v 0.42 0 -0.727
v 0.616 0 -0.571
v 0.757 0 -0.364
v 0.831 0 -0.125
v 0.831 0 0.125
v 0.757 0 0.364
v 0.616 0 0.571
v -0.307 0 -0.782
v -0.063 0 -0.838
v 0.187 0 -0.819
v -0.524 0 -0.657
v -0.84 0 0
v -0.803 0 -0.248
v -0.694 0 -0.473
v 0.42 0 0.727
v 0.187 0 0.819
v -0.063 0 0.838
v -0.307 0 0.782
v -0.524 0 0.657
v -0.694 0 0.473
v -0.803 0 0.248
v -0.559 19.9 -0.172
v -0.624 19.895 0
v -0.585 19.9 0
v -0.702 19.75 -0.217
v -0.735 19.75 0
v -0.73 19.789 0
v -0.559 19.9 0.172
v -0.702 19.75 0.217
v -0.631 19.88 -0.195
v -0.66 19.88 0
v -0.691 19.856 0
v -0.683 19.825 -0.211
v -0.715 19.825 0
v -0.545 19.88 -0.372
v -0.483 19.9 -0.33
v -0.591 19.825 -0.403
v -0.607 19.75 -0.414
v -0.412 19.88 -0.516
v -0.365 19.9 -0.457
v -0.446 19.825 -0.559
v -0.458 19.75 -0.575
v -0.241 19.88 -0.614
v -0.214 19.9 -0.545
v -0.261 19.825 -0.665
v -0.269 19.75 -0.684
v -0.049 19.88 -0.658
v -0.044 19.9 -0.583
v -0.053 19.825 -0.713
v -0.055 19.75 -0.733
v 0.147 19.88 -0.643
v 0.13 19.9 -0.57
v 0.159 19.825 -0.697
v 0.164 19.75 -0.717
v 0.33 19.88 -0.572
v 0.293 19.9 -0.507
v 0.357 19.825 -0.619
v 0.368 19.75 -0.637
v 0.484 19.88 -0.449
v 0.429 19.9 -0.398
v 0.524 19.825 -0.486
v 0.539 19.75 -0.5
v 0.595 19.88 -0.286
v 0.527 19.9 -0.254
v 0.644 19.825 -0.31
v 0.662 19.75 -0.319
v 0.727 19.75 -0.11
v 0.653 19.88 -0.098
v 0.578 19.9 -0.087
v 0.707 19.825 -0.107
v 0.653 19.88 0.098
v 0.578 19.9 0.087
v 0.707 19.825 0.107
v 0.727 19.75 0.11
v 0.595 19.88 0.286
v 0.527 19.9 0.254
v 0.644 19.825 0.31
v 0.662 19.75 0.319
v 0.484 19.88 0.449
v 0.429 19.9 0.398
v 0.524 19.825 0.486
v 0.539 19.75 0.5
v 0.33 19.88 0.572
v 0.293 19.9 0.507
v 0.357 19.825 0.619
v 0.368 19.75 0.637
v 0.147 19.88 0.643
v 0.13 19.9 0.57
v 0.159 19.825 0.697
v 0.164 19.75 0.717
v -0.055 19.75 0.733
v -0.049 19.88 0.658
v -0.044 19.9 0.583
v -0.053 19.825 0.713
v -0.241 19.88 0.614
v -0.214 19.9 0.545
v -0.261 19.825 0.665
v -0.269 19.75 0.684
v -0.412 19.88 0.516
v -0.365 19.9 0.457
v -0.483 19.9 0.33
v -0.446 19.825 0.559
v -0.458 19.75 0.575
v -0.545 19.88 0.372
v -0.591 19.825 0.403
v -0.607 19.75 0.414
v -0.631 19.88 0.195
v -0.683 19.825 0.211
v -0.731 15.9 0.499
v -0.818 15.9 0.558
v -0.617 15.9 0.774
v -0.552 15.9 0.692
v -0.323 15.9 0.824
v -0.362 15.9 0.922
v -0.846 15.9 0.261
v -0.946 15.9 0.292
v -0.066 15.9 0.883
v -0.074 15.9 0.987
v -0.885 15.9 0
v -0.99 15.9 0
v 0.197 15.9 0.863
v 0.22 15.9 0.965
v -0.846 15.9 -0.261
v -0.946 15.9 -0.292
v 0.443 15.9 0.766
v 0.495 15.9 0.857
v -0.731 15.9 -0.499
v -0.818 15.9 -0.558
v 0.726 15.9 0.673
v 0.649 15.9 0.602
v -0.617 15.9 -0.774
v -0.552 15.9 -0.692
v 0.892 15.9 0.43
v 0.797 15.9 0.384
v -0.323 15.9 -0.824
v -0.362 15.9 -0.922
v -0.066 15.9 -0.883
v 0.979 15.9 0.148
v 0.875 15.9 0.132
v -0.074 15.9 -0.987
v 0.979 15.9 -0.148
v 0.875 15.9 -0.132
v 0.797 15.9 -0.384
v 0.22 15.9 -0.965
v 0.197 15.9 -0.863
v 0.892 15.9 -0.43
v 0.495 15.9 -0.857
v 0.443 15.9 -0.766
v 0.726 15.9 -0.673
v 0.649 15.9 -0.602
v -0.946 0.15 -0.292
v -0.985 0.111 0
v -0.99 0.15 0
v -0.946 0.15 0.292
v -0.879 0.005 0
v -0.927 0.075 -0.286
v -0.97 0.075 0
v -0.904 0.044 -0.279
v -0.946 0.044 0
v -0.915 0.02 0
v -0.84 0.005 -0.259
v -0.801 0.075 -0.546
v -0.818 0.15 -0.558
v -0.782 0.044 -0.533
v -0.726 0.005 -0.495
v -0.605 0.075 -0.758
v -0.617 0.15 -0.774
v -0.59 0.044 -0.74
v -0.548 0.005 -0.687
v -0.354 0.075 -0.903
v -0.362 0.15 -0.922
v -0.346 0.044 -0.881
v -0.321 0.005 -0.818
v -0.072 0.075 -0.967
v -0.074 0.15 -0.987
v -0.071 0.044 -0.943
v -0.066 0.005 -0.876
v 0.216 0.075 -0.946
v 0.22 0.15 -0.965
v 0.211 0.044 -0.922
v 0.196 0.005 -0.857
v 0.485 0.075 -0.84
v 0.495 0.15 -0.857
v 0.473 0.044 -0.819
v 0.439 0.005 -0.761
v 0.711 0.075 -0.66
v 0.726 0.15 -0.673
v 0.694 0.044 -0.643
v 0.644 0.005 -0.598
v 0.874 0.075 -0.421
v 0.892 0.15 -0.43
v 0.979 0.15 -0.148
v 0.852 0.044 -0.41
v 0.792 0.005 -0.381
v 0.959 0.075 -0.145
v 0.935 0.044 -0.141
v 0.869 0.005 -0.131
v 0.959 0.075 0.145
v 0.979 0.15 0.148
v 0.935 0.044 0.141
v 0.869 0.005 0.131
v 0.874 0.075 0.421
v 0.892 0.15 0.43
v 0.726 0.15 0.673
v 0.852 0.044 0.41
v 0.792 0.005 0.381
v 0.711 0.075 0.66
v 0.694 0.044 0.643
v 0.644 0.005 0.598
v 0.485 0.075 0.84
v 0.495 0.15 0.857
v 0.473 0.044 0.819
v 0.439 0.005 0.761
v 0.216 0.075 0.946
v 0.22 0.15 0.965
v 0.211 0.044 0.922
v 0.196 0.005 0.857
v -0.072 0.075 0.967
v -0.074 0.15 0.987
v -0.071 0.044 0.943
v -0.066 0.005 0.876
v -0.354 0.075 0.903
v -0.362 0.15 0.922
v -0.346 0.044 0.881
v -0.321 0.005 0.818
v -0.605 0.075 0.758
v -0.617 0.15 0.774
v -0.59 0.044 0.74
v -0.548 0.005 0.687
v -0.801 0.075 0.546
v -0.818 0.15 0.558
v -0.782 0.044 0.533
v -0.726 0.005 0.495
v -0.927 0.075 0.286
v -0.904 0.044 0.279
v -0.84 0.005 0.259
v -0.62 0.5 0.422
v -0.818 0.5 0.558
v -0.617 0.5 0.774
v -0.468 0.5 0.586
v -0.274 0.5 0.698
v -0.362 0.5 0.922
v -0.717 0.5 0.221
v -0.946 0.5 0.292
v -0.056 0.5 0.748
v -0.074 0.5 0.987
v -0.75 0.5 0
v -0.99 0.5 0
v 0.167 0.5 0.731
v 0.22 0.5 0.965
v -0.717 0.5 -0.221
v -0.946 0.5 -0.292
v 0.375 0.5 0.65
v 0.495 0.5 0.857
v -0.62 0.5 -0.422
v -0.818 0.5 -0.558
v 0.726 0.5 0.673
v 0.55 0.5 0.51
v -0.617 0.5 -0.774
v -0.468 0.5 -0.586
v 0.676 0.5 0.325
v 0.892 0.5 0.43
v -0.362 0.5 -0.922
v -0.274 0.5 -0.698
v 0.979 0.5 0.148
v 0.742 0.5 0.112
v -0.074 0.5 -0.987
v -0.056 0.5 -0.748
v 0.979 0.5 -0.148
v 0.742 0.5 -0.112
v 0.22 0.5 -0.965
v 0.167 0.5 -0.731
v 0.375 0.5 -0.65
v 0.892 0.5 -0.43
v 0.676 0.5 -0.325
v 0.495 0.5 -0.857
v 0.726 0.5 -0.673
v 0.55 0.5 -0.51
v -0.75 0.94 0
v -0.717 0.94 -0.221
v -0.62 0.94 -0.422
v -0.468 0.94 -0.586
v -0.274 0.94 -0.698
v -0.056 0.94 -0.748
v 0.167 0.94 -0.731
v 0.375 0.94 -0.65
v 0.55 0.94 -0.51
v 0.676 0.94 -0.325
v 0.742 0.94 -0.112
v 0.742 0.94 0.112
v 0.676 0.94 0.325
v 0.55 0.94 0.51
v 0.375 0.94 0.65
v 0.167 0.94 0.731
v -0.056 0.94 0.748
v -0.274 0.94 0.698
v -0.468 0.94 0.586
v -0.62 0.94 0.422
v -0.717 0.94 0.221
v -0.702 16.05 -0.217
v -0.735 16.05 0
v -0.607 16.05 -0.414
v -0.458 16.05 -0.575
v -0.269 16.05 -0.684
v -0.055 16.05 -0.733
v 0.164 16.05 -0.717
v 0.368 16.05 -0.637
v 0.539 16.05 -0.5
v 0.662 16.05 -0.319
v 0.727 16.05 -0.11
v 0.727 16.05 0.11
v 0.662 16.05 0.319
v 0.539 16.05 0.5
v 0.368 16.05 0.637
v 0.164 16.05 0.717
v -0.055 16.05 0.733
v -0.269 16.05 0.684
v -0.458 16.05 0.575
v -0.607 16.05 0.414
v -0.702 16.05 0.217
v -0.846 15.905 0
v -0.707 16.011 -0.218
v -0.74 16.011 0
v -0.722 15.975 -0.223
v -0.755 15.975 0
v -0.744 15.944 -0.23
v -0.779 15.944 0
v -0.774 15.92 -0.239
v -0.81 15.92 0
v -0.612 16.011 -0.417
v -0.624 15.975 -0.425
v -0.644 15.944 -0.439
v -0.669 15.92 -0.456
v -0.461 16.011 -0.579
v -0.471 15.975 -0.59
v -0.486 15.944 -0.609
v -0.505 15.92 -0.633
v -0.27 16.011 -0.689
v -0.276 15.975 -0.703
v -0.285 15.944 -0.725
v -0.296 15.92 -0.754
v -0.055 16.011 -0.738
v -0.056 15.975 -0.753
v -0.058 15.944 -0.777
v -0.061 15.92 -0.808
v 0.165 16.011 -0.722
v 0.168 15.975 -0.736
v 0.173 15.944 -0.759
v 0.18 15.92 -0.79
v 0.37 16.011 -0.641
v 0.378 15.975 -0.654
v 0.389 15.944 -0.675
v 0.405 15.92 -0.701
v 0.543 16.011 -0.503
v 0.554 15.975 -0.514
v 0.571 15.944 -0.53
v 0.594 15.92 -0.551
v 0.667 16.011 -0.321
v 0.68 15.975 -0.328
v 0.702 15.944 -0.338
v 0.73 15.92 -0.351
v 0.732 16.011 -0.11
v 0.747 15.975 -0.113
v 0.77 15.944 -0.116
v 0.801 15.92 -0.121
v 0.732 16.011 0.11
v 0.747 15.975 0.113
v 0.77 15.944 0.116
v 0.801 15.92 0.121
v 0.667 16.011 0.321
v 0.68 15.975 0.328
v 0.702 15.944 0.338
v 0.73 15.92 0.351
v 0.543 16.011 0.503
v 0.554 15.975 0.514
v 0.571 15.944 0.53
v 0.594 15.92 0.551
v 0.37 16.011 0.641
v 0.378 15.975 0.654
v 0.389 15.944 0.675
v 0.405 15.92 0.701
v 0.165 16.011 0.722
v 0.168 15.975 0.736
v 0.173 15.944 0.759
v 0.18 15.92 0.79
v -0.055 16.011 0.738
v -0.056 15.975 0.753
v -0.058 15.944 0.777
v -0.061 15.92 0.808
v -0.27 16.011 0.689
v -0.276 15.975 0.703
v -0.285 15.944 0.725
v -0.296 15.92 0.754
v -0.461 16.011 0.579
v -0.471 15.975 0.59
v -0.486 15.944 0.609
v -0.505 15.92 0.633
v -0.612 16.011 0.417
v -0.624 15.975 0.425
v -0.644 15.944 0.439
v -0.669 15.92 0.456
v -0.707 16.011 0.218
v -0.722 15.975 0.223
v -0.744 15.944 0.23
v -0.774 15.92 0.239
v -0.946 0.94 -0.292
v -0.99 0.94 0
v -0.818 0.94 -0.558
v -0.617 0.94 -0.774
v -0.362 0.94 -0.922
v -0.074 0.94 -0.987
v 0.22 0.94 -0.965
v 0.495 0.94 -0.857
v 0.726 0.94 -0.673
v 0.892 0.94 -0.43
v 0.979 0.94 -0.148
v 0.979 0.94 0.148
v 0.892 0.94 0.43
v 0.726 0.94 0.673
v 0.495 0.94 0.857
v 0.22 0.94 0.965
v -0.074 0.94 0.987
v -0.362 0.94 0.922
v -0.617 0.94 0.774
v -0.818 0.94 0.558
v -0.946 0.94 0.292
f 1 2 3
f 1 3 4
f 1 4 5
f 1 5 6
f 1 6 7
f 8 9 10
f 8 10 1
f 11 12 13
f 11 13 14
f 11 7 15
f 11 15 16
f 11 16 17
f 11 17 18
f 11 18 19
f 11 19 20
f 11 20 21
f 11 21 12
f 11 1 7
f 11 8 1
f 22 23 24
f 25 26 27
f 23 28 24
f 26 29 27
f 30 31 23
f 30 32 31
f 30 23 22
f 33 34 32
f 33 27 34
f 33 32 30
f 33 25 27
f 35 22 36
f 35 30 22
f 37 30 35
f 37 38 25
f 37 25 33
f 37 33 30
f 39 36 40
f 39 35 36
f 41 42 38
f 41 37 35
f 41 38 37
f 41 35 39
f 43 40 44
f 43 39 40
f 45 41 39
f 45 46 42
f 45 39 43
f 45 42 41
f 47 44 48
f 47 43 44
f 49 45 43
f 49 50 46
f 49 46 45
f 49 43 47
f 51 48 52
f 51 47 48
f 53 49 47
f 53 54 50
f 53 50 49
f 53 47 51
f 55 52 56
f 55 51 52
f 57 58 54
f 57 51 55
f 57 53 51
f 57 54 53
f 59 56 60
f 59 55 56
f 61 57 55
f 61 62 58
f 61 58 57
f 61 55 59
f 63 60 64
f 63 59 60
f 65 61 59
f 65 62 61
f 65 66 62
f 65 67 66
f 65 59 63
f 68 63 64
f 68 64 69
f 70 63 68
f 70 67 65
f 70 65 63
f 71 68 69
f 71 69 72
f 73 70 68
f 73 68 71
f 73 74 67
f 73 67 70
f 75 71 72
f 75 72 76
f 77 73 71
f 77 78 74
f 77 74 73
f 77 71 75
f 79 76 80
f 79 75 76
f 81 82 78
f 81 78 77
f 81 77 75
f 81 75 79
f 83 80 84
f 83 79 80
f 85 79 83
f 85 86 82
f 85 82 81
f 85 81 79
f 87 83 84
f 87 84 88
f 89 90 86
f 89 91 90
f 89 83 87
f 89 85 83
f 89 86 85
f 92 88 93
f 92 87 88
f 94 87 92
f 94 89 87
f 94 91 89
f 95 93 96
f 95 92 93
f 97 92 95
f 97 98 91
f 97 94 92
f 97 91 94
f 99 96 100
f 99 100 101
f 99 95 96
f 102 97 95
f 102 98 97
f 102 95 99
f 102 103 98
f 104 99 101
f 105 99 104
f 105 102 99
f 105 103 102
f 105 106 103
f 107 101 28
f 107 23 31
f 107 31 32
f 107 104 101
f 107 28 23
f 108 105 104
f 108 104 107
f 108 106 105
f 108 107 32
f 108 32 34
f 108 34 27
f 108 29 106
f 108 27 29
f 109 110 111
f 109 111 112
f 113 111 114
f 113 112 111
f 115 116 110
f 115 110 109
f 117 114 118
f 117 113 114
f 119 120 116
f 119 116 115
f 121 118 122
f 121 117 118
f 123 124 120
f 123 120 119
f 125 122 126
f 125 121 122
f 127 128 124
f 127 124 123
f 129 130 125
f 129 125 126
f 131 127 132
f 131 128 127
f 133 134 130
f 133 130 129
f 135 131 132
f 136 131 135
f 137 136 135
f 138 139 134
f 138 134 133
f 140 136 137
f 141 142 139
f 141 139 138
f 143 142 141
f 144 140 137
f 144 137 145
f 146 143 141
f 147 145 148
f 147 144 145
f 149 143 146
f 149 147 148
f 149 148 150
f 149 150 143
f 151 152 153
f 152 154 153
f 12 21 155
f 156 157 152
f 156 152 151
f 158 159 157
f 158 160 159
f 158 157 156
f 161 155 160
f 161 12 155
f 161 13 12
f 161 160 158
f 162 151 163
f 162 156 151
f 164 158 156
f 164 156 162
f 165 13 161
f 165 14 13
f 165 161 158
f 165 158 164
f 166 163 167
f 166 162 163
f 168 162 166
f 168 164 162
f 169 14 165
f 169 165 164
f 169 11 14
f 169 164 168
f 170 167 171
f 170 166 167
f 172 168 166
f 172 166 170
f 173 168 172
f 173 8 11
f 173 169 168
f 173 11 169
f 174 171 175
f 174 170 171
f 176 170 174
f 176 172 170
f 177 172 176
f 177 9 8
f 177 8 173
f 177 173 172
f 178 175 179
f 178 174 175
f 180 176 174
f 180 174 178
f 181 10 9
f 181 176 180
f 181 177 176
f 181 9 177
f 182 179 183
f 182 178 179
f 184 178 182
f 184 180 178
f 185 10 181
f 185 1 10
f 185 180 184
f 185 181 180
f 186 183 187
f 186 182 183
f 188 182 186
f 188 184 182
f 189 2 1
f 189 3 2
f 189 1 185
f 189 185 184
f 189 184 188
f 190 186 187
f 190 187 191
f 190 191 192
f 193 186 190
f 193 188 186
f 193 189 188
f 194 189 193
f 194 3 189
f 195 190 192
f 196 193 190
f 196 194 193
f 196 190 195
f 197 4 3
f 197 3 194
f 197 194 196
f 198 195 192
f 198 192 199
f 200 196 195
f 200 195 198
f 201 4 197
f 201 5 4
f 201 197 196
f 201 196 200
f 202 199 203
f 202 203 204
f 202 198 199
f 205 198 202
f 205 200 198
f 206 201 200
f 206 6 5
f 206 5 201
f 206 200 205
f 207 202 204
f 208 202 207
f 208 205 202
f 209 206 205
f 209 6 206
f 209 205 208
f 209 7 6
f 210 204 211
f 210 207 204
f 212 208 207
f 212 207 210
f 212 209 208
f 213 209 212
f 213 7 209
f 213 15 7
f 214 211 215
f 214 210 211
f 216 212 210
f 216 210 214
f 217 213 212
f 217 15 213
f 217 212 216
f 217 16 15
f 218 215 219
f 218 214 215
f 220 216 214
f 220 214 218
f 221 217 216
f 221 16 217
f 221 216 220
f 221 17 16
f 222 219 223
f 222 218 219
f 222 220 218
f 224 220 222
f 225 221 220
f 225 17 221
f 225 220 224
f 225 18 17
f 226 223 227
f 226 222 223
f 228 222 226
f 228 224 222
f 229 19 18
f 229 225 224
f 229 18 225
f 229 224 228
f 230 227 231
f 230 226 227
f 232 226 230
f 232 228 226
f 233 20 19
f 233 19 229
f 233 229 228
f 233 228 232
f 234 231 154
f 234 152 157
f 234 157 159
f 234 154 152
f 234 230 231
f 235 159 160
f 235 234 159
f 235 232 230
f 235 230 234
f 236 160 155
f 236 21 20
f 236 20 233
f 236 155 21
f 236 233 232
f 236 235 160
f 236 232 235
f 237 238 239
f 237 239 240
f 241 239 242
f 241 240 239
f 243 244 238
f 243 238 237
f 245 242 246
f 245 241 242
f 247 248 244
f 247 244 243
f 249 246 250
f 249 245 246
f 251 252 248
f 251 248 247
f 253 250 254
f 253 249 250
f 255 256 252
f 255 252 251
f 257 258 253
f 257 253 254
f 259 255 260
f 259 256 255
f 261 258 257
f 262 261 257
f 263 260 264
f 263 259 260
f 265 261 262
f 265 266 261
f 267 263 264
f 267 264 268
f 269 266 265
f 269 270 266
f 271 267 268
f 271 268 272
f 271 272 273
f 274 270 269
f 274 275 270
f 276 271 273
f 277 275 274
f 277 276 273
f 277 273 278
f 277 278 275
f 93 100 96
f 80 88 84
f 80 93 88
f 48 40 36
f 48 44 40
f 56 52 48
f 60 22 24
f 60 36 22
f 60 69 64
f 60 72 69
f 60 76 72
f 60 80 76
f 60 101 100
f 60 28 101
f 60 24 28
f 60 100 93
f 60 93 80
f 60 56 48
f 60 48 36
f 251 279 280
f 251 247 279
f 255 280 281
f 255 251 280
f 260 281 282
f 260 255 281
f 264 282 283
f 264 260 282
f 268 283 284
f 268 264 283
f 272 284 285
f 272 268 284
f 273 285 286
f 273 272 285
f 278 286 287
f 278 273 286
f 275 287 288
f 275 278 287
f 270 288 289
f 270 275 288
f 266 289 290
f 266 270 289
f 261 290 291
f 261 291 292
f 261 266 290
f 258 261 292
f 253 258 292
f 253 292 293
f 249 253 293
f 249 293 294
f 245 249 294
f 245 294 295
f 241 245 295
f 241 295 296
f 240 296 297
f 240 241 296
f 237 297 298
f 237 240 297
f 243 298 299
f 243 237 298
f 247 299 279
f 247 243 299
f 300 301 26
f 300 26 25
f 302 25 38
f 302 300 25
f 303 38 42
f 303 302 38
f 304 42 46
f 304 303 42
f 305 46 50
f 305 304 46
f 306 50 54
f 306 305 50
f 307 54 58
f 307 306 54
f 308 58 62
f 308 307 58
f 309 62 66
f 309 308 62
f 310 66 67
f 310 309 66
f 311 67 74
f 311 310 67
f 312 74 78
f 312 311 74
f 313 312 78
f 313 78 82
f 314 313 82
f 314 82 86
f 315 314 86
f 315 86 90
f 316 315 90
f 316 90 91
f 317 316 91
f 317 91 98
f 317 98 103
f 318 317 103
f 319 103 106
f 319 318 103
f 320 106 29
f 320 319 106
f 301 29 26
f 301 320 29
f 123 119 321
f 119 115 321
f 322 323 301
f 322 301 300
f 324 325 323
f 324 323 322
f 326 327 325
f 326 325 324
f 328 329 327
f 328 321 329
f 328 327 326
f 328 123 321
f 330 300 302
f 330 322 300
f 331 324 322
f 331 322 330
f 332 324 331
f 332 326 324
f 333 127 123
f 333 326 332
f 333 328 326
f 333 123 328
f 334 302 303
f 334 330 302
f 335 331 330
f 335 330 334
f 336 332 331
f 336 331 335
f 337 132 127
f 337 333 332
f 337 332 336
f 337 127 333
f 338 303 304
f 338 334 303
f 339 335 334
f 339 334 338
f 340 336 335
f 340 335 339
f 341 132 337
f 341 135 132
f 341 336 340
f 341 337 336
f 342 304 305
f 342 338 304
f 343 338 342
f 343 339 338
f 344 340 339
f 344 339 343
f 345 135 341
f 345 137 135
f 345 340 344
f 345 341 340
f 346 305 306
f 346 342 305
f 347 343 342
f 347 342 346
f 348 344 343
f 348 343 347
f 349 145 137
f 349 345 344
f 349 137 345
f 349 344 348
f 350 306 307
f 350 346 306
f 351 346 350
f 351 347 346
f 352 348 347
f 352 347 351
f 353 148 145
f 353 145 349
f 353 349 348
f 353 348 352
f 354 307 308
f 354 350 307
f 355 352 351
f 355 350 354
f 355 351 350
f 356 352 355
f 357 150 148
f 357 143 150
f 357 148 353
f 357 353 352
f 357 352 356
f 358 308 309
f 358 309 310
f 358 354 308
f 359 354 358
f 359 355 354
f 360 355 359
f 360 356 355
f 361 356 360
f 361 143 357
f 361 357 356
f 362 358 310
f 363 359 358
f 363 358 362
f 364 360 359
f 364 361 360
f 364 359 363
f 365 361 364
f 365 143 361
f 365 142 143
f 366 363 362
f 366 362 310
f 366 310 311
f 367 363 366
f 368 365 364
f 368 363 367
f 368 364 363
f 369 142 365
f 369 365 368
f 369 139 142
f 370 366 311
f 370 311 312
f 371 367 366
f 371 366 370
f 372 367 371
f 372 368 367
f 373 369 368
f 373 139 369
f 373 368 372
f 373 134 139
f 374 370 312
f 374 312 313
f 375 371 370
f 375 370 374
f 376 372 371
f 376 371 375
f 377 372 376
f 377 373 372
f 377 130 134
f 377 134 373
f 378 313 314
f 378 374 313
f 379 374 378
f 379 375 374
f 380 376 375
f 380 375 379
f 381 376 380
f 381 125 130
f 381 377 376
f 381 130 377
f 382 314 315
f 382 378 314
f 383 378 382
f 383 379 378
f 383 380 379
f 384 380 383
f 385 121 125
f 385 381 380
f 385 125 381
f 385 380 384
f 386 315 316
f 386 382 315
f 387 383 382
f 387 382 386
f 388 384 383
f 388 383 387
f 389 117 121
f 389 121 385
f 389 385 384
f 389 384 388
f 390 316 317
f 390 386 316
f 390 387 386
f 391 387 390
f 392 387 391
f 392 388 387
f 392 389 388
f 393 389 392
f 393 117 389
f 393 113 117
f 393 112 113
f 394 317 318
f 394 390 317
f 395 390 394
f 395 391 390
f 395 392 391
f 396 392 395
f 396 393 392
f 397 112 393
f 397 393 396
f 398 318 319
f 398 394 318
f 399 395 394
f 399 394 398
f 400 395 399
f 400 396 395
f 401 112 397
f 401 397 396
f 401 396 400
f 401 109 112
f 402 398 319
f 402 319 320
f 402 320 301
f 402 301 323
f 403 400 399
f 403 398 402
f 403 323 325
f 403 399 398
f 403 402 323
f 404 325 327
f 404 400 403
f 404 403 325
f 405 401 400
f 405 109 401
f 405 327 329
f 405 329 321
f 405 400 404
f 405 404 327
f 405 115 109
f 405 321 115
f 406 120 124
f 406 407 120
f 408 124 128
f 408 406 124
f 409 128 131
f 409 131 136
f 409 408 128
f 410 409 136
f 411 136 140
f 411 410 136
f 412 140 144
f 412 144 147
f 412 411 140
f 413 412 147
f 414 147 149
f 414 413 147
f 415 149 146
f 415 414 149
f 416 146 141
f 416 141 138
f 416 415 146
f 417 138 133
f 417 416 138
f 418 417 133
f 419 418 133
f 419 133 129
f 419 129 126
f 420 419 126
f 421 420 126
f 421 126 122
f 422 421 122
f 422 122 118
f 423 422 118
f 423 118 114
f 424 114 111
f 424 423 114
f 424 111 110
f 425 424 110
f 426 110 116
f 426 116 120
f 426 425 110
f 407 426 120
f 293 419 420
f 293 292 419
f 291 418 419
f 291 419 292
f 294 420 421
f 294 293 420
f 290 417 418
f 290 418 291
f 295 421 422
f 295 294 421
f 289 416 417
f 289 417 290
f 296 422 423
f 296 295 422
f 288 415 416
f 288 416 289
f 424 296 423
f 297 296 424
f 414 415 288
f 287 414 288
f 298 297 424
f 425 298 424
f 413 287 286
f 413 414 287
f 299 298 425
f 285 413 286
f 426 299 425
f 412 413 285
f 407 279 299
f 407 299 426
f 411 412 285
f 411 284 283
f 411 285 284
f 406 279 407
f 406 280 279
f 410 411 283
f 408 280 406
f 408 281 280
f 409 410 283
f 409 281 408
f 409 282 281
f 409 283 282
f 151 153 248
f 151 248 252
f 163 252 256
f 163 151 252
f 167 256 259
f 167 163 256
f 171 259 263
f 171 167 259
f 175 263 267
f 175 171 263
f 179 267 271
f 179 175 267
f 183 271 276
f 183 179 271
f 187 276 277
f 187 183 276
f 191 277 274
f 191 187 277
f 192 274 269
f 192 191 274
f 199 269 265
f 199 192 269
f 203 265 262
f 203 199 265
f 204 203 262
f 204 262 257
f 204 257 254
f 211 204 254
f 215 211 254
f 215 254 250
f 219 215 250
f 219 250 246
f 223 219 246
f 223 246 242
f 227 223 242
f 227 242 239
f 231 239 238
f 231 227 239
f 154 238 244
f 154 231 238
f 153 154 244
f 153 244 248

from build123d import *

# Parameters (mm, degrees)
FILLET1_R = 0.15


with BuildPart() as part:
    # Sketch1 → Revolve1 (revolve)
    with BuildSketch(Plane.XY):
        Polygon((0, 19.9), (-0.735, 19.9), (-0.735, 15.9), (-0.99, 15.9), (-0.99, 0.94), (-0.75, 0.94), (-0.75, 0.5), (-0.99, 0.5), (-0.99, 0), (0, 0), align=None)
    revolve(axis=Axis((0, 19.9, 0), (0, -1, 0)))

    # Fillet1
    fillet1_edges = [part.edges().sort_by_distance(p)[0] for p in [
        (0.735, 15.9, 0),
        (0.735, 19.9, 0),
        (0.99, 0, 0),
    ]]
    fillet(fillet1_edges, radius=FILLET1_R)


solid = part.part
